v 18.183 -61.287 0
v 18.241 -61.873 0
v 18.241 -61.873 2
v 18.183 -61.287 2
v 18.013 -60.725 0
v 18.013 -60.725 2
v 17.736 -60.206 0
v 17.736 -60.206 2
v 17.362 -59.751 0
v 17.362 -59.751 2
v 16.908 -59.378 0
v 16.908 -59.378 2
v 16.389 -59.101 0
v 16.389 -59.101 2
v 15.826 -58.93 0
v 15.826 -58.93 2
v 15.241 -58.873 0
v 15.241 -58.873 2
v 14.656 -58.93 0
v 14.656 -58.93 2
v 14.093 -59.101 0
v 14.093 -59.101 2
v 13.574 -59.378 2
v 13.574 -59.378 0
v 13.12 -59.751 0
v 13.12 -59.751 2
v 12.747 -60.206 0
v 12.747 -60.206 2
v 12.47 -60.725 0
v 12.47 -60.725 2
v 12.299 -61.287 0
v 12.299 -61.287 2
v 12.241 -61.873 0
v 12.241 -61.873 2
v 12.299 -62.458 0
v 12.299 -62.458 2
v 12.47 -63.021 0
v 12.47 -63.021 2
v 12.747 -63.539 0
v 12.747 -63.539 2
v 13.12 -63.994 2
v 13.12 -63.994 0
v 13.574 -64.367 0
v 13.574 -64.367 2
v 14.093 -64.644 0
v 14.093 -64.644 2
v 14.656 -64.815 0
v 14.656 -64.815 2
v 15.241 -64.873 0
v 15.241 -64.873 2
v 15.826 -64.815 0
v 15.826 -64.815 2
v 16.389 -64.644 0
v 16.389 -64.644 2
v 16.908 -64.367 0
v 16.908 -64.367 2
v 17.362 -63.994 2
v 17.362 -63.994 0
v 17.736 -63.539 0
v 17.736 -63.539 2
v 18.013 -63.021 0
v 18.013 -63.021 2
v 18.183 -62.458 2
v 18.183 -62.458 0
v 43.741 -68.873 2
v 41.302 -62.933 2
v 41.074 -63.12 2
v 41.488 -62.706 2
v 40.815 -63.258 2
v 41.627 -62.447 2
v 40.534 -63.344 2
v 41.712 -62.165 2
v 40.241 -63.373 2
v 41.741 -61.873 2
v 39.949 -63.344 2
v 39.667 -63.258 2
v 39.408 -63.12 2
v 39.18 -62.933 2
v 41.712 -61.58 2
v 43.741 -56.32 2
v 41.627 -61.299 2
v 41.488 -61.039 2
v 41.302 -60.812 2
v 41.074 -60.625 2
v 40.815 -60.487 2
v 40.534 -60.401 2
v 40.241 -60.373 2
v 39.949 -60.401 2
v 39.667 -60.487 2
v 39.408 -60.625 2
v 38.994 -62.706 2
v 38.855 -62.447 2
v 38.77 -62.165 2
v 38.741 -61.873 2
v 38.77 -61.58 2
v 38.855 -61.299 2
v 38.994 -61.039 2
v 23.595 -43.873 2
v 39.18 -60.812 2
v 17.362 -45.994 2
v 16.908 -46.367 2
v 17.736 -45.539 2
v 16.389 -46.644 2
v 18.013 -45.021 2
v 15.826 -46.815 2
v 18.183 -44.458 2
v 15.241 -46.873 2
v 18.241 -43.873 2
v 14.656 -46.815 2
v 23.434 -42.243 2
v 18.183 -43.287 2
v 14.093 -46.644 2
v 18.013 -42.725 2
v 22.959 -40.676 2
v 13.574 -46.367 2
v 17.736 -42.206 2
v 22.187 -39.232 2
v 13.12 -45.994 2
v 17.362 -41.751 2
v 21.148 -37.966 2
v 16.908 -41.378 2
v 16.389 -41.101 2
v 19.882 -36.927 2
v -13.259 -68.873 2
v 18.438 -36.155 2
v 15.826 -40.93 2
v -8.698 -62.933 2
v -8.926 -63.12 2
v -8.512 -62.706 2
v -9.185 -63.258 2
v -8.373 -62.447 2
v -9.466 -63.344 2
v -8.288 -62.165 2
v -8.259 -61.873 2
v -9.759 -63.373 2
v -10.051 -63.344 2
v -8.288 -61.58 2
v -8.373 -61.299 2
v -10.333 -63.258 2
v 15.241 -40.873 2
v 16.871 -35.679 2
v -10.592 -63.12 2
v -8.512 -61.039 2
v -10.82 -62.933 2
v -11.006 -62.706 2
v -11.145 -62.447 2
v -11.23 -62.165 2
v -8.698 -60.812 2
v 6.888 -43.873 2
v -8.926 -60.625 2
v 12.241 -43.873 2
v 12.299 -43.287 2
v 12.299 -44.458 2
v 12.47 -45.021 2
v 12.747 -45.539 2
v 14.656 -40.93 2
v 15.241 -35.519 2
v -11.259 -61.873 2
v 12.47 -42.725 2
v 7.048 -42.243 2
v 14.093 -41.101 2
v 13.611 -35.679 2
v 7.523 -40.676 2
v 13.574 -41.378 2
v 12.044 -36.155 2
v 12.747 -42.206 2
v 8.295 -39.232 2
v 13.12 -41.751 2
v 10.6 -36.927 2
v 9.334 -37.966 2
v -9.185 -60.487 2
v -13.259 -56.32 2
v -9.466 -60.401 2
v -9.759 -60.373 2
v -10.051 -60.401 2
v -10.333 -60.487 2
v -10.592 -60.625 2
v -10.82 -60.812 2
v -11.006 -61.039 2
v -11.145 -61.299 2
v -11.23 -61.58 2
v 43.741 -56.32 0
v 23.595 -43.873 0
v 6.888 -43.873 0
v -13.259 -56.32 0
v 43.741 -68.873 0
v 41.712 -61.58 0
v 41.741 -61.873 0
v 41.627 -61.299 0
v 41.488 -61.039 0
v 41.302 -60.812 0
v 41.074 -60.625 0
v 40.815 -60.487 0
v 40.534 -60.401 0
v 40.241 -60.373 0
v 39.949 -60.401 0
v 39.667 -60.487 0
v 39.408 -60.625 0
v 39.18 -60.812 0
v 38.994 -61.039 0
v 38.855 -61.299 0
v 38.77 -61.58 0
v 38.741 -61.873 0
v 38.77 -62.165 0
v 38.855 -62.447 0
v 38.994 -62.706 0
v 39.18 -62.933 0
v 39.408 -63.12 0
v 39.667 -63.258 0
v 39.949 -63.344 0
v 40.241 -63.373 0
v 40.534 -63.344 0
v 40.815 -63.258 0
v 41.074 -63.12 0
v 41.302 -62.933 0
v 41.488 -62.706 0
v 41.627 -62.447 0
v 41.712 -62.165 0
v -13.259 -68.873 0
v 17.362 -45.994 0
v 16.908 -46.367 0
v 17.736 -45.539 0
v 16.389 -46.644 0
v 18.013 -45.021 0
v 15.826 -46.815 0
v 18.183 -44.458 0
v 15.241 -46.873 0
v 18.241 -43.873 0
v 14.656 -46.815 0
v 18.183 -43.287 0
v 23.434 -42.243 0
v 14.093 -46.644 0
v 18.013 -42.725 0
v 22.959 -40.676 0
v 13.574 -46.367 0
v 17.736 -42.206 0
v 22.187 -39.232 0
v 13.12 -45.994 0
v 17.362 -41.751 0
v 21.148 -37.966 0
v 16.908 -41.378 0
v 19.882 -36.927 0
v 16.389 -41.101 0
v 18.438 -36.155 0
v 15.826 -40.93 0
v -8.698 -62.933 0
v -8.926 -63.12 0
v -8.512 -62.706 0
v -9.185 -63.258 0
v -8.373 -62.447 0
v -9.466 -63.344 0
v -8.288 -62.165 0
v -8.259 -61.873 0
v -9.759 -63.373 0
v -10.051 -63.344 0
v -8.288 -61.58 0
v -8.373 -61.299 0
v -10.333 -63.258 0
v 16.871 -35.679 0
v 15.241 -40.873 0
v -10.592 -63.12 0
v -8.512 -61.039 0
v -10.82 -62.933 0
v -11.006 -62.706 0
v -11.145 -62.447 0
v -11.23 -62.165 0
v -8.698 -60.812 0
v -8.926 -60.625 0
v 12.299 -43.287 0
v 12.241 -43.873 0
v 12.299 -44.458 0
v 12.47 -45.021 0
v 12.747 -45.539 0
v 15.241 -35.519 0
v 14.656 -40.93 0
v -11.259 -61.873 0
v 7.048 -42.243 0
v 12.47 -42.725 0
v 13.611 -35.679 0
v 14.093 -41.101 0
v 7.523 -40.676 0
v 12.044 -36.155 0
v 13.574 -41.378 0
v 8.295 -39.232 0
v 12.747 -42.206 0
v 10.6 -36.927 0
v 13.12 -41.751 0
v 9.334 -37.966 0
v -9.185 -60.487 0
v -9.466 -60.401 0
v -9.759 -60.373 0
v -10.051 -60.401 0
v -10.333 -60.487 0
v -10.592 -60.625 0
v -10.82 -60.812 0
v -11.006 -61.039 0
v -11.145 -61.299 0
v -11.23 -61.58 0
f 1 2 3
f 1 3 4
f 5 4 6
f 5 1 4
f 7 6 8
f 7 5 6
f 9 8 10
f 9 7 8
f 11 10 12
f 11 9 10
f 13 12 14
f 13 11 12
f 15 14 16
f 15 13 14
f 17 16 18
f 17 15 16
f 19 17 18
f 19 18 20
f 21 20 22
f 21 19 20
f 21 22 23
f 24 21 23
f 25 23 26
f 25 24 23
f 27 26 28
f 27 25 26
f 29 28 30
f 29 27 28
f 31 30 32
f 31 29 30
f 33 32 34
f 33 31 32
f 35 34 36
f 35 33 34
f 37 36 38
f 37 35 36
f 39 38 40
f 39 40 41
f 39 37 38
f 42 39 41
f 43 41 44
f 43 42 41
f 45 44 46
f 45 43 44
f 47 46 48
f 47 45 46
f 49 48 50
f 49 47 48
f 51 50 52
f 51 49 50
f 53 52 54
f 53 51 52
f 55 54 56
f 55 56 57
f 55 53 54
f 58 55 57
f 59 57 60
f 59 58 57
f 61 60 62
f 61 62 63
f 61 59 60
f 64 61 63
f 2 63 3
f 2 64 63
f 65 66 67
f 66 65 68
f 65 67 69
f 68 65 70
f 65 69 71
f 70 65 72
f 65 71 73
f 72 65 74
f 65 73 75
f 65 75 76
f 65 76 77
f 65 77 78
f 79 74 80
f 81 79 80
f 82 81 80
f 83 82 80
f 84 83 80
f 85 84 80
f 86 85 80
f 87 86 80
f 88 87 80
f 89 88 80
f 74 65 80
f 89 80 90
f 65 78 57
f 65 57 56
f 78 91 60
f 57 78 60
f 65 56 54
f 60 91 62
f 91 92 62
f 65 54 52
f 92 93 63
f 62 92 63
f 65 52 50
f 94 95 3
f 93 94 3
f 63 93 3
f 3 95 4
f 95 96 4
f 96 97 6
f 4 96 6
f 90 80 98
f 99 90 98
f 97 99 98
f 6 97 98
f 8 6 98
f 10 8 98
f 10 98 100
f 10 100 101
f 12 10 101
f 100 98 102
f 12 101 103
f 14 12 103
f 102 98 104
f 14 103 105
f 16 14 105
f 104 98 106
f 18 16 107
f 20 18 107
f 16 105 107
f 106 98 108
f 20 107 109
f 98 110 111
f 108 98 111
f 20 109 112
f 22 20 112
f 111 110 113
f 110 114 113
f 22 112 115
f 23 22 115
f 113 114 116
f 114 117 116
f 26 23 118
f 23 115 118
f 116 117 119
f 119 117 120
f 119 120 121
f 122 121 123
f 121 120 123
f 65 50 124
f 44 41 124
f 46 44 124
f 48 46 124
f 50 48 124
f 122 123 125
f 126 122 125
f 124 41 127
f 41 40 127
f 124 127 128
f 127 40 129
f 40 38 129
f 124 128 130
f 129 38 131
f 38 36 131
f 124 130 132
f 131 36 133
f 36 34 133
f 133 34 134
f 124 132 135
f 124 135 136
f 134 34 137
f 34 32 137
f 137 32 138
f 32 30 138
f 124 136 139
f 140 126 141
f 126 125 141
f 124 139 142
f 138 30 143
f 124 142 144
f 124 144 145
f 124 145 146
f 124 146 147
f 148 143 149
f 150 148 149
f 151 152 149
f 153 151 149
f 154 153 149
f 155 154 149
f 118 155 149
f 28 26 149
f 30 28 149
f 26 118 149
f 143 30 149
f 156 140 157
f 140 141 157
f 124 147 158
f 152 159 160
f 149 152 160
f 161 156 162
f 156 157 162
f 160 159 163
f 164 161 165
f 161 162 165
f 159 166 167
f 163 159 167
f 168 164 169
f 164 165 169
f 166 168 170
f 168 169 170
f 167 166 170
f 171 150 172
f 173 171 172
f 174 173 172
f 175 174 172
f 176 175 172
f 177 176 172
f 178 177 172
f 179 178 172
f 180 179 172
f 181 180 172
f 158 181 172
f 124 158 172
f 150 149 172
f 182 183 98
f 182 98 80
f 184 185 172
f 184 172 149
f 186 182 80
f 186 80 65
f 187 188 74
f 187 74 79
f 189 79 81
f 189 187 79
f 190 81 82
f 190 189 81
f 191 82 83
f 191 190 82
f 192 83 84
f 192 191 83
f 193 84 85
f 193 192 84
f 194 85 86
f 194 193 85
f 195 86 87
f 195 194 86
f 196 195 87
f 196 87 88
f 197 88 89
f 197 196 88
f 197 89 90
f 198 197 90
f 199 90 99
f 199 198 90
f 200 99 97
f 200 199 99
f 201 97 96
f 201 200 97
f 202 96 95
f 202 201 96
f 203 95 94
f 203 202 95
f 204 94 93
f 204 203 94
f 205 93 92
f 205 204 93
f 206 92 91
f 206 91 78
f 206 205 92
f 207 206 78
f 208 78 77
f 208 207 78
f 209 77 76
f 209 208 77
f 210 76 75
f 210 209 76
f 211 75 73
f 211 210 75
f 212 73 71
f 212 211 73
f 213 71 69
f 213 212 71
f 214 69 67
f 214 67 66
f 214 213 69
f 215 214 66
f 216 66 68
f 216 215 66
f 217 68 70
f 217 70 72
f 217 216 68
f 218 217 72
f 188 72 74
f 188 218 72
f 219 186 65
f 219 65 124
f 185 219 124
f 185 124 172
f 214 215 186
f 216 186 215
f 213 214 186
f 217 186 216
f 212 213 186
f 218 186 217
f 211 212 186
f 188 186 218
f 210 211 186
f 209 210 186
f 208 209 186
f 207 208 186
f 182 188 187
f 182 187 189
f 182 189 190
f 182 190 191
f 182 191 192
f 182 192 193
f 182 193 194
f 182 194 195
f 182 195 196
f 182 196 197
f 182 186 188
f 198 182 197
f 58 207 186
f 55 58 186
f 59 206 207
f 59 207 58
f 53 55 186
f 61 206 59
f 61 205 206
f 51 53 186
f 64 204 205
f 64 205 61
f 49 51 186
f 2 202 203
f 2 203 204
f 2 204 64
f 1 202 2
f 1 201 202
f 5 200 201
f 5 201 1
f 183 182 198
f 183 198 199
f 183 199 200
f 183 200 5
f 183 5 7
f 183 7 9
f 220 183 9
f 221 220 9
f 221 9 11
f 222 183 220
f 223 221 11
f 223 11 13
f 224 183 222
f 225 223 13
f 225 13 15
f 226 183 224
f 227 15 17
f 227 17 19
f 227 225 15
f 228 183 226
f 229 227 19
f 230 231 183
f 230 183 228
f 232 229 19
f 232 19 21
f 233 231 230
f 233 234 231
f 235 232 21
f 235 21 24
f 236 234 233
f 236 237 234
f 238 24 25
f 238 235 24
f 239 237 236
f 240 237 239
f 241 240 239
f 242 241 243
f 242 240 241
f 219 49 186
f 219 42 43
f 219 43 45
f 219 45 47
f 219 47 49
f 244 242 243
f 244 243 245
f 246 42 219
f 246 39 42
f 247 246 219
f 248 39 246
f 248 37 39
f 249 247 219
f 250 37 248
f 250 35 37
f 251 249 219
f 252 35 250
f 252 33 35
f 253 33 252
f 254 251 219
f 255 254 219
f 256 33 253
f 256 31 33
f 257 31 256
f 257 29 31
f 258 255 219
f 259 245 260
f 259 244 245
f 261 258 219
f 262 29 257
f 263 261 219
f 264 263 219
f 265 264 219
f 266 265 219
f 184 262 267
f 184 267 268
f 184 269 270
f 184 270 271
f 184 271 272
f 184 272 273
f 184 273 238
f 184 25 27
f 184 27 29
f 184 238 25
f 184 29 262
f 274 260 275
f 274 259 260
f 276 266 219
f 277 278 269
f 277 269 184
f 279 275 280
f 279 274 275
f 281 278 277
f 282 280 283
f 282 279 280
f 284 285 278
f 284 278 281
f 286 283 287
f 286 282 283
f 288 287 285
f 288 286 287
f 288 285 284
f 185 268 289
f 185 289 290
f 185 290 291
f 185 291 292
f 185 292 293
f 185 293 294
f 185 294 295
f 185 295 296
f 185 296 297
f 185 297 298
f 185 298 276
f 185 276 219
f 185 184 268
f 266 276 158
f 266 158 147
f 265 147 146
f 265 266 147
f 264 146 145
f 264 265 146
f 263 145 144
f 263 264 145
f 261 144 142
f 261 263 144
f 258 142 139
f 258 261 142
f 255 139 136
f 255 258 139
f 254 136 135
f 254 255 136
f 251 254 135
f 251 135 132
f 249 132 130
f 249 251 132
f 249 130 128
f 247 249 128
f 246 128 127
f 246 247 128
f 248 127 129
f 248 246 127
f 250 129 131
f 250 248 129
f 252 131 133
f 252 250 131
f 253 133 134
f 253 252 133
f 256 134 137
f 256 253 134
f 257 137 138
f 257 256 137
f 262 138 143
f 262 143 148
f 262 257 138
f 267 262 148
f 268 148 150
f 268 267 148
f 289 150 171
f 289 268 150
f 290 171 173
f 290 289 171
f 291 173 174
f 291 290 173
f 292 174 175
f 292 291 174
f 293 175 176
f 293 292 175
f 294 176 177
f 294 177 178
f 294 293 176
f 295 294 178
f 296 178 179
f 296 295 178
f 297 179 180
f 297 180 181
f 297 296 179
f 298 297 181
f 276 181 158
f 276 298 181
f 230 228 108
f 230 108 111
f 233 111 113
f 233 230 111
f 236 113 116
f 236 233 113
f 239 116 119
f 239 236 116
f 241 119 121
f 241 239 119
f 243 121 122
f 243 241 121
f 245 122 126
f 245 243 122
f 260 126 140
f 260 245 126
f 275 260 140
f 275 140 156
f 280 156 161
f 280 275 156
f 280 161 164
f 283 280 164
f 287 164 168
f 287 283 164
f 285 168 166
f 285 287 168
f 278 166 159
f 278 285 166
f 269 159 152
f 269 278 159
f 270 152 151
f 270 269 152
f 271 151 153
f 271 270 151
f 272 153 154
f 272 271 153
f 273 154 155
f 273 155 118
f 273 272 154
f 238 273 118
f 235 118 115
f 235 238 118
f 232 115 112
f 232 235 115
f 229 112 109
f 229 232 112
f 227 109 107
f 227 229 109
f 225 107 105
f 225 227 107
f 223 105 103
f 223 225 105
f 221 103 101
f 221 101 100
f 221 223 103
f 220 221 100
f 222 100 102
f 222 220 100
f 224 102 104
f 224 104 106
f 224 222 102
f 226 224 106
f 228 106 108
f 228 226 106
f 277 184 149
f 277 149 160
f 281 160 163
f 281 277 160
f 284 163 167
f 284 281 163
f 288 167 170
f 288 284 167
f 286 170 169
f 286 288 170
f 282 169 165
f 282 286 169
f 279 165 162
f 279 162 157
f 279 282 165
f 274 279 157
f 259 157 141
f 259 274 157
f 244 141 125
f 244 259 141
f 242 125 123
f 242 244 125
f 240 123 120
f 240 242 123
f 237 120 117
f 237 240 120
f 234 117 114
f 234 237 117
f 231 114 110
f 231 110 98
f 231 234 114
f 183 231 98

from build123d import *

# Parameters (mm, degrees)
SKETCH_1_R      = 3
SKETCH_1_R_2    = 1.5
EXTRUDE_1_DEPTH = 2


with BuildPart() as part:
    # 草图1 → 凸台-拉伸1 (new body)
    with BuildSketch(Plane.XY):
        with BuildLine():
            Line((23.59477523, -43.872599913), (43.741142958, -56.320462917))
            Line((43.741142958, -56.320462917), (43.741142958, -68.872599913))
            Line((43.741142958, -68.872599913), (15.241142958, -68.872599913))
            Line((15.241142958, -68.872599913), (-13.258857042, -68.872599913))
            Line((-13.258857042, -68.872599913), (-13.258857042, -56.320462917))
            Line((-13.258857042, -56.320462917), (6.887510685, -43.872599913))
            ThreePointArc((6.887510685, -43.872599913), (15.241142958, -35.51896764), (23.59477523, -43.872599913))
        make_face()
        with Locations((15.241142958, -61.872599913)):
            Circle(SKETCH_1_R, mode=Mode.SUBTRACT)
        with Locations((40.241142958, -61.872599913)):
            Circle(SKETCH_1_R_2, mode=Mode.SUBTRACT)
        with Locations(Location((-9.758857042, -61.872599913, 0), (0, 0, 180))):
            Circle(SKETCH_1_R_2, mode=Mode.SUBTRACT)
        with Locations((15.241142958, -43.872599913)):
            Circle(SKETCH_1_R, mode=Mode.SUBTRACT)
    extrude(amount=EXTRUDE_1_DEPTH)


solid = part.part
